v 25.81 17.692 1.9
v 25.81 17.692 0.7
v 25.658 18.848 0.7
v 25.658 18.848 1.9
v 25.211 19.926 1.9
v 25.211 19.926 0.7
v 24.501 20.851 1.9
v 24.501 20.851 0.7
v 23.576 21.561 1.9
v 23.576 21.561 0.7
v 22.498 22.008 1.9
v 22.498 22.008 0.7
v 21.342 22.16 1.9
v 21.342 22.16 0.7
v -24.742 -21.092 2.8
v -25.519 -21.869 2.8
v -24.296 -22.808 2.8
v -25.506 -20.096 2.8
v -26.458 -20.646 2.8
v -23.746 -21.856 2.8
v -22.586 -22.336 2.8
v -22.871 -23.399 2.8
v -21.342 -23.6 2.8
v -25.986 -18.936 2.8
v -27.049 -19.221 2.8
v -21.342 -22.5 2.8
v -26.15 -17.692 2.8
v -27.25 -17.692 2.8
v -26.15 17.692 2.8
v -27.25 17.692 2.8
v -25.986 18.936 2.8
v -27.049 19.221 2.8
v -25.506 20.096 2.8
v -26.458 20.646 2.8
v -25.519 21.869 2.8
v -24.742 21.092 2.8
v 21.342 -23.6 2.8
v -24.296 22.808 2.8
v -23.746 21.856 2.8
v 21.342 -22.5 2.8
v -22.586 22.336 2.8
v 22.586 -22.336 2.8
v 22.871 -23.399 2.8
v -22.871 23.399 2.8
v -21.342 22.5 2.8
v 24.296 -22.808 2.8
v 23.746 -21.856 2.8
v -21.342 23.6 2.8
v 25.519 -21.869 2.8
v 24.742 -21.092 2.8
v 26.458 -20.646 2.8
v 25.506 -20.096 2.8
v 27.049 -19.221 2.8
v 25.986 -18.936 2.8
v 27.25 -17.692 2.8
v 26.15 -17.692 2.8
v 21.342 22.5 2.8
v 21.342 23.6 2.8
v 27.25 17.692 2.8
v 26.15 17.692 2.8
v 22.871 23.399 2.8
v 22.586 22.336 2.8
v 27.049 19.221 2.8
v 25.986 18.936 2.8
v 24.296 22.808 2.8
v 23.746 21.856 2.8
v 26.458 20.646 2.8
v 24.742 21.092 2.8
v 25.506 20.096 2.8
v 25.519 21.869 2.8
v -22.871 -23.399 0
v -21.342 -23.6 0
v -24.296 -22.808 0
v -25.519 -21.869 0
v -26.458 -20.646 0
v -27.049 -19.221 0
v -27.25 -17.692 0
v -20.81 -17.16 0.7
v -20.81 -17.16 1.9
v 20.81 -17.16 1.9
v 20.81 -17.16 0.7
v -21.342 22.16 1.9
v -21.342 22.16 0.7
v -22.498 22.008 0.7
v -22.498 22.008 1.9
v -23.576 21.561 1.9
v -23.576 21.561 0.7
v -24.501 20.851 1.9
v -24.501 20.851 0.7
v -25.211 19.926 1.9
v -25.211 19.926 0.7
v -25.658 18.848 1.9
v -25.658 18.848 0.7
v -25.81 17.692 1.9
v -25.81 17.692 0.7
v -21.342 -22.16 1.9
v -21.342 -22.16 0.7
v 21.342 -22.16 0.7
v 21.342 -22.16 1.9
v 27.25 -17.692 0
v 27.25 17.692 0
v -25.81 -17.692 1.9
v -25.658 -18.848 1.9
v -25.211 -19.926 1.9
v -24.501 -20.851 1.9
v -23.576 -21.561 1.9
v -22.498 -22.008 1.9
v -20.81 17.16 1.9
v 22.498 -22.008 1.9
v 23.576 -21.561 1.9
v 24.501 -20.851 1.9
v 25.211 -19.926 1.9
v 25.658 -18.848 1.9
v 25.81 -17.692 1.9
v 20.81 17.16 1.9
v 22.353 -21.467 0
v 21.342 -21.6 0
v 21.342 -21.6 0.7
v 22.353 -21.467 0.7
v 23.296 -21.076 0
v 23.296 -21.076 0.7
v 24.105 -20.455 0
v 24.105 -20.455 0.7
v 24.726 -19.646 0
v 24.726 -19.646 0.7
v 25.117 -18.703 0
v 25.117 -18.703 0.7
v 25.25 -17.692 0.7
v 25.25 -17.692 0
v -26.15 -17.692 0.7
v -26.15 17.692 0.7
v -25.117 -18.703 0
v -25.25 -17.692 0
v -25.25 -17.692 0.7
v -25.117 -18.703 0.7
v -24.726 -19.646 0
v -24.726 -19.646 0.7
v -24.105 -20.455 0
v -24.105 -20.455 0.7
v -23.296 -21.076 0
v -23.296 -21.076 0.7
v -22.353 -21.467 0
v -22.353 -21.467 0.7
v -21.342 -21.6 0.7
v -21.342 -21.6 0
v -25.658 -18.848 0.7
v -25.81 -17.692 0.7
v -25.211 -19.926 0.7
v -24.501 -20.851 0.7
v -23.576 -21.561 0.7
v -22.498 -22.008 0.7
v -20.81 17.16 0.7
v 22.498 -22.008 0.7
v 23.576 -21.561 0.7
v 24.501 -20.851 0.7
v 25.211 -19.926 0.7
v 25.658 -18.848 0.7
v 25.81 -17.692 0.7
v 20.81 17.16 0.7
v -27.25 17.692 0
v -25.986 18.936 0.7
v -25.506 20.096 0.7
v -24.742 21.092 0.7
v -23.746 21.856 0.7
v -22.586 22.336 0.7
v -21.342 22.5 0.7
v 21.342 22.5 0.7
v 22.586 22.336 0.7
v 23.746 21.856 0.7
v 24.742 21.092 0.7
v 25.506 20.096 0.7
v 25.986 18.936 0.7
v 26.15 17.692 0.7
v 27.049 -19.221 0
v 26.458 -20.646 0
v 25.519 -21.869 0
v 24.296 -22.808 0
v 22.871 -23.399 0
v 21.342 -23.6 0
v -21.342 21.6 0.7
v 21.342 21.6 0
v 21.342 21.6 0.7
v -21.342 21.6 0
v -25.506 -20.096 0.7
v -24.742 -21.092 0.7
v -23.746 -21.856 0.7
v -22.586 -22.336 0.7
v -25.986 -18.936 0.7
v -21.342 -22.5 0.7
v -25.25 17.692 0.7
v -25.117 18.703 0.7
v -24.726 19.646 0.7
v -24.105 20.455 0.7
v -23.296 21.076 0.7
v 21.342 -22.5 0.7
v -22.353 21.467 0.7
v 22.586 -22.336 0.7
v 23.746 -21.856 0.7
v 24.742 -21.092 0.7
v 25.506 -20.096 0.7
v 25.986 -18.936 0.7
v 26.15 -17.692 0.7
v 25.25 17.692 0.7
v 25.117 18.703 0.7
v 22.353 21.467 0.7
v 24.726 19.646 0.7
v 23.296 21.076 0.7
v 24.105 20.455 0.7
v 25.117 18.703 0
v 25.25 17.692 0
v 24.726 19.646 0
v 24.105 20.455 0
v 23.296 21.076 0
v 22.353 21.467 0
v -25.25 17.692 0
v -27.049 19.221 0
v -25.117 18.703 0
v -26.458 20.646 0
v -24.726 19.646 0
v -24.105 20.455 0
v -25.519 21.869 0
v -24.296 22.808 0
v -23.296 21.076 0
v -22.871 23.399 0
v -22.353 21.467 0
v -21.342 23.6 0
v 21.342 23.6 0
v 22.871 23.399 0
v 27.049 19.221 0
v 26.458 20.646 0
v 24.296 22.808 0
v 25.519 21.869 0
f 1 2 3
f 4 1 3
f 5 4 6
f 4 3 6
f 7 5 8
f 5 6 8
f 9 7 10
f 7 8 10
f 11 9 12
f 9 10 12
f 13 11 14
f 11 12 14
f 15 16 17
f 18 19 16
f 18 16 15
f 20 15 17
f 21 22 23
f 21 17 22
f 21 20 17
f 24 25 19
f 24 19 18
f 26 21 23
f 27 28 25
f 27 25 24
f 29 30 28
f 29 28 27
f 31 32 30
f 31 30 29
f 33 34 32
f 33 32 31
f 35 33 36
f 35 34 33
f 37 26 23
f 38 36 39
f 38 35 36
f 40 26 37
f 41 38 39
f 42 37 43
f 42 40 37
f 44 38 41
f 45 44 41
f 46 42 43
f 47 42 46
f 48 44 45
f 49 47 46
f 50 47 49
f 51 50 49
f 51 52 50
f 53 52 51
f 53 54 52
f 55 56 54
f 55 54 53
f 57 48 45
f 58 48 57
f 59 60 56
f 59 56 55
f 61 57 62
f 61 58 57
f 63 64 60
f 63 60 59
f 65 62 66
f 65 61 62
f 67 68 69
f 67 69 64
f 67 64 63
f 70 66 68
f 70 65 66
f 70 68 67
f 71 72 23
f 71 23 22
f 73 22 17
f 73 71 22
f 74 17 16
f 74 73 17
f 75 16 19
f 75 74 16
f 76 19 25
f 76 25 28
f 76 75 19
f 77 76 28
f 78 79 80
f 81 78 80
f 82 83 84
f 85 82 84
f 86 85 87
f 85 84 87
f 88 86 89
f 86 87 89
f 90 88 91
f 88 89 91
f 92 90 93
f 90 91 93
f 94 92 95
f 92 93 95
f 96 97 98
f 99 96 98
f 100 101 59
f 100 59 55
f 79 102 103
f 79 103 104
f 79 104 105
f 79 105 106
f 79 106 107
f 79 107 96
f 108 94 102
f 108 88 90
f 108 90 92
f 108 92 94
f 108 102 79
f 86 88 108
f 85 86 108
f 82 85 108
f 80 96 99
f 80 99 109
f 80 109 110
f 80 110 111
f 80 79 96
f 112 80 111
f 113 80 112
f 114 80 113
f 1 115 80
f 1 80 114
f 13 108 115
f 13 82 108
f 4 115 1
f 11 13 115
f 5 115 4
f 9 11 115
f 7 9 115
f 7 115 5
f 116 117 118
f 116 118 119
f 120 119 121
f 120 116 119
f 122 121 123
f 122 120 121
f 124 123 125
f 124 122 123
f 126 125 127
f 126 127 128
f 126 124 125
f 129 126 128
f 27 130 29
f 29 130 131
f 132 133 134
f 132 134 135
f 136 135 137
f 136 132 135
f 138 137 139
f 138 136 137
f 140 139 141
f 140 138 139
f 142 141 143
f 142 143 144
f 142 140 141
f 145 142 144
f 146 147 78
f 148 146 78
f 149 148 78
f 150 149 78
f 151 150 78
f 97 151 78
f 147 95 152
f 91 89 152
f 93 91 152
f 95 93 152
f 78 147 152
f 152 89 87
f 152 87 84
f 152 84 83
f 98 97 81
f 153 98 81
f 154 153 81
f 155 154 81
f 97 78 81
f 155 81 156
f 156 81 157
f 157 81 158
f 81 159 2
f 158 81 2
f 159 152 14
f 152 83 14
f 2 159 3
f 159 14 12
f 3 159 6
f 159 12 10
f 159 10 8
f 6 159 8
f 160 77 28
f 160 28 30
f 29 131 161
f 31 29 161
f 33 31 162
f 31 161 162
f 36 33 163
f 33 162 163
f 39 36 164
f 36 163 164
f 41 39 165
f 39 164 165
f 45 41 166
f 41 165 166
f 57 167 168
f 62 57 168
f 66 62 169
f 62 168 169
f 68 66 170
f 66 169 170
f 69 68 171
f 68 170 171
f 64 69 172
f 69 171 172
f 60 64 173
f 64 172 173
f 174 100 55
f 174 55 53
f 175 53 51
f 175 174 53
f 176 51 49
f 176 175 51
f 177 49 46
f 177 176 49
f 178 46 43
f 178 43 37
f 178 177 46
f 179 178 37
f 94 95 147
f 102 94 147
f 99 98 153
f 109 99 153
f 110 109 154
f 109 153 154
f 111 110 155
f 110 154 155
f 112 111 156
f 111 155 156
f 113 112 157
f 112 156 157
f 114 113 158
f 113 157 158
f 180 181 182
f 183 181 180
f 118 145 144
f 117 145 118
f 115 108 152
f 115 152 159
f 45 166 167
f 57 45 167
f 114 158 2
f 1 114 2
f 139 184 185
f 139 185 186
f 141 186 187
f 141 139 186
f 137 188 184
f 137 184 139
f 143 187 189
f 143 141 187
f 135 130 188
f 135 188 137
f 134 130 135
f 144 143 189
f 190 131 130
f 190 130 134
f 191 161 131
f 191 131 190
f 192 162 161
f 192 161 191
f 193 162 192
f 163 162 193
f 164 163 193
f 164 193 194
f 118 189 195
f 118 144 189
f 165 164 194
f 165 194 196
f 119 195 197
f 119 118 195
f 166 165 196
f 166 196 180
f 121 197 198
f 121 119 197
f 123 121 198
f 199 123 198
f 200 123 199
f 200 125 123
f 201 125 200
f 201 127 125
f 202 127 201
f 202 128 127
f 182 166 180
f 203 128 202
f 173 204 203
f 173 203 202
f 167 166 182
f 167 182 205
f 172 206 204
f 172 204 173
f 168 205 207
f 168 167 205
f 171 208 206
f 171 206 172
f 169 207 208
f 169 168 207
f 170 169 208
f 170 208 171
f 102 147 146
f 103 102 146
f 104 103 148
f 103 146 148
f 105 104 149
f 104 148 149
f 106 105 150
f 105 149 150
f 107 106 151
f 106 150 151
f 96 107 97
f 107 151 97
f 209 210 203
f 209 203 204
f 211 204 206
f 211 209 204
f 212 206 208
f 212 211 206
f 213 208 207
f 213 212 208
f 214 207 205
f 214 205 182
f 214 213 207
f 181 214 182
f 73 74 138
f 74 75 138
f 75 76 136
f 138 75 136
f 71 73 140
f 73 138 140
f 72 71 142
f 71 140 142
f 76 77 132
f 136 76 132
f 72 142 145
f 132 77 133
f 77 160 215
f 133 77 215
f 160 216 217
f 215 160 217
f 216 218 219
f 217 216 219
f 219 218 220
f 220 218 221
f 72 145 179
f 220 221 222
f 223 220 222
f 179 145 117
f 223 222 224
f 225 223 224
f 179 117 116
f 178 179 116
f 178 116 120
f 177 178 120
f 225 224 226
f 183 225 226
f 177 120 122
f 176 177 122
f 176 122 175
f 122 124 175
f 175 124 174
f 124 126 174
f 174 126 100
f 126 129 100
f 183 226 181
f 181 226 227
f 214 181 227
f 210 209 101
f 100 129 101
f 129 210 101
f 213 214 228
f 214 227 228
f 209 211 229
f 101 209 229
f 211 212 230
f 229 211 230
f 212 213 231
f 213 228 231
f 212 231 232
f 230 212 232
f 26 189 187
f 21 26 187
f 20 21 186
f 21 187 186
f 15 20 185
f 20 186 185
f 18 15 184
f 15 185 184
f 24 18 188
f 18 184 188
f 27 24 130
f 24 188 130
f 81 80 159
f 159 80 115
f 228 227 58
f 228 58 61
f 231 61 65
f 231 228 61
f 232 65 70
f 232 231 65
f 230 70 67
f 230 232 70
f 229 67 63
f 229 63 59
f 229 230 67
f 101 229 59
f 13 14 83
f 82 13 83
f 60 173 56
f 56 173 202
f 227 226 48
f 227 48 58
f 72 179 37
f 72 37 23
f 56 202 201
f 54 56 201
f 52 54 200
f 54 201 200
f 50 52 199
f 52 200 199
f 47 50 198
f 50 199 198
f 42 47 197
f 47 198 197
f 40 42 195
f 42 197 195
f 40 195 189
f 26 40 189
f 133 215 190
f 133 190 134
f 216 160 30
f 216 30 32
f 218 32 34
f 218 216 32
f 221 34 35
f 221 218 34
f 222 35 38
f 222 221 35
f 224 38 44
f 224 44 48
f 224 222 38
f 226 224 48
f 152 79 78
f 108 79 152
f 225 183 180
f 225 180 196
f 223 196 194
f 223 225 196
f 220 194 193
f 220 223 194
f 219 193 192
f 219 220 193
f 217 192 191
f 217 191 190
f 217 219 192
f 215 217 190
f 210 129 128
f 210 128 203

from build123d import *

# Parameters (mm, degrees)
SURFACE_EXTRUDE1_1_DEPTH = 2.8
THICKEN1_T1              = 1.1
BOSS_EXTRUDE1_DEPTH      = 0.7
BOSS_EXTRUDE2_DEPTH      = 1.2
SKETCH5_W                = 41.62
SKETCH5_H                = 34.32
CUT_EXTRUDE1_DEPTH       = 37.098926577


with BuildPart() as body_1:
    # Surface-Extrude1: a surface, the sketch's curves swept straight by 2.8 mm
    with BuildLine(Plane.XY, mode=Mode.PRIVATE) as surface_extrude1_1_path:
        Line((-21.341673888, 22.5), (21.341673888, 22.5))
        ThreePointArc((21.341673888, 22.5), (24.741673888, 21.091673888), (26.15, 17.691673888))
        Line((26.15, 17.691673888), (26.15, -17.691673888))
        ThreePointArc((26.15, -17.691673888), (24.741673888, -21.091673888), (21.341673888, -22.5))
        Line((21.341673888, -22.5), (-21.341673888, -22.5))
        ThreePointArc((-21.341673888, -22.5), (-24.741673888, -21.091673888), (-26.15, -17.691673888))
        Line((-26.15, -17.691673888), (-26.15, 17.691673888))
        ThreePointArc((-26.15, 17.691673888), (-24.741673888, 21.091673888), (-21.341673888, 22.5))
    surface_extrude1_1 = Shell.extrude(surface_extrude1_1_path.wire(), (0 * SURFACE_EXTRUDE1_1_DEPTH, 0 * SURFACE_EXTRUDE1_1_DEPTH, 1 * SURFACE_EXTRUDE1_1_DEPTH))
    add(Solid.thicken(surface_extrude1_1, THICKEN1_T1))

    # Sketch3 → Boss-Extrude1 (add)
    with BuildSketch(Plane(origin=(0, 0, 0), x_dir=(-1, 0, 0), z_dir=(0, 0, -1))):
        with BuildLine():
            Line((-21.341673888, 22.5), (21.341673888, 22.5))
            ThreePointArc((21.341673888, 22.5), (24.741673888, 21.091673888), (26.15, 17.691673888))
            Line((26.15, 17.691673888), (26.15, -17.691673888))
            ThreePointArc((26.15, -17.691673888), (24.741673888, -21.091673888), (21.341673888, -22.5))
            Line((21.341673888, -22.5), (-21.341673888, -22.5))
            ThreePointArc((-21.341673888, -22.5), (-24.741673888, -21.091673888), (-26.15, -17.691673888))
            Line((-26.15, -17.691673888), (-26.15, 17.691673888))
            ThreePointArc((-26.15, 17.691673888), (-24.741673888, 21.091673888), (-21.341673888, 22.5))
        make_face()
        with BuildLine():
            Line((25.25, 17.691673888), (25.25, -17.691673888))
            ThreePointArc((25.25, -17.691673888), (24.105277785, -20.455277785), (21.341673888, -21.6))
            Line((21.341673888, -21.6), (-21.341673888, -21.6))
            ThreePointArc((-21.341673888, -21.6), (-24.105277785, -20.455277785), (-25.25, -17.691673888))
            Line((-25.25, -17.691673888), (-25.25, 17.691673888))
            ThreePointArc((-25.25, 17.691673888), (-24.105277785, 20.455277785), (-21.341673888, 21.6))
            Line((-21.341673888, 21.6), (21.341673888, 21.6))
            ThreePointArc((21.341673888, 21.6), (24.105277785, 20.455277785), (25.25, 17.691673888))
        make_face(mode=Mode.SUBTRACT)
    extrude(amount=-BOSS_EXTRUDE1_DEPTH)


with BuildPart() as body_2:
    # Sketch4 → Boss-Extrude2 (new body)
    with BuildSketch(Plane.XY.offset(0.7)):
        with BuildLine():
            Line((-25.81, 17.691673888), (-25.81, -17.691673888))
            ThreePointArc((-25.81, -17.691673888), (-24.501257582, -20.851257582), (-21.341673888, -22.16))
            Line((-21.341673888, -22.16), (21.341673888, -22.16))
            ThreePointArc((21.341673888, -22.16), (24.501257582, -20.851257582), (25.81, -17.691673888))
            Line((25.81, -17.691673888), (25.81, 17.691673888))
            ThreePointArc((25.81, 17.691673888), (24.501257582, 20.851257582), (21.341673888, 22.16))
            Line((21.341673888, 22.16), (-21.341673888, 22.16))
            ThreePointArc((-21.341673888, 22.16), (-24.501257582, 20.851257582), (-25.81, 17.691673888))
        make_face()
    extrude(amount=BOSS_EXTRUDE2_DEPTH)

    # Sketch5 → Cut-Extrude1 (cut, through all)
    with BuildSketch(Plane.XY.offset(1.9)):
        Rectangle(SKETCH5_W, SKETCH5_H)
    extrude(amount=-CUT_EXTRUDE1_DEPTH, mode=Mode.SUBTRACT)


solid = Compound([body_1.part, body_2.part])
